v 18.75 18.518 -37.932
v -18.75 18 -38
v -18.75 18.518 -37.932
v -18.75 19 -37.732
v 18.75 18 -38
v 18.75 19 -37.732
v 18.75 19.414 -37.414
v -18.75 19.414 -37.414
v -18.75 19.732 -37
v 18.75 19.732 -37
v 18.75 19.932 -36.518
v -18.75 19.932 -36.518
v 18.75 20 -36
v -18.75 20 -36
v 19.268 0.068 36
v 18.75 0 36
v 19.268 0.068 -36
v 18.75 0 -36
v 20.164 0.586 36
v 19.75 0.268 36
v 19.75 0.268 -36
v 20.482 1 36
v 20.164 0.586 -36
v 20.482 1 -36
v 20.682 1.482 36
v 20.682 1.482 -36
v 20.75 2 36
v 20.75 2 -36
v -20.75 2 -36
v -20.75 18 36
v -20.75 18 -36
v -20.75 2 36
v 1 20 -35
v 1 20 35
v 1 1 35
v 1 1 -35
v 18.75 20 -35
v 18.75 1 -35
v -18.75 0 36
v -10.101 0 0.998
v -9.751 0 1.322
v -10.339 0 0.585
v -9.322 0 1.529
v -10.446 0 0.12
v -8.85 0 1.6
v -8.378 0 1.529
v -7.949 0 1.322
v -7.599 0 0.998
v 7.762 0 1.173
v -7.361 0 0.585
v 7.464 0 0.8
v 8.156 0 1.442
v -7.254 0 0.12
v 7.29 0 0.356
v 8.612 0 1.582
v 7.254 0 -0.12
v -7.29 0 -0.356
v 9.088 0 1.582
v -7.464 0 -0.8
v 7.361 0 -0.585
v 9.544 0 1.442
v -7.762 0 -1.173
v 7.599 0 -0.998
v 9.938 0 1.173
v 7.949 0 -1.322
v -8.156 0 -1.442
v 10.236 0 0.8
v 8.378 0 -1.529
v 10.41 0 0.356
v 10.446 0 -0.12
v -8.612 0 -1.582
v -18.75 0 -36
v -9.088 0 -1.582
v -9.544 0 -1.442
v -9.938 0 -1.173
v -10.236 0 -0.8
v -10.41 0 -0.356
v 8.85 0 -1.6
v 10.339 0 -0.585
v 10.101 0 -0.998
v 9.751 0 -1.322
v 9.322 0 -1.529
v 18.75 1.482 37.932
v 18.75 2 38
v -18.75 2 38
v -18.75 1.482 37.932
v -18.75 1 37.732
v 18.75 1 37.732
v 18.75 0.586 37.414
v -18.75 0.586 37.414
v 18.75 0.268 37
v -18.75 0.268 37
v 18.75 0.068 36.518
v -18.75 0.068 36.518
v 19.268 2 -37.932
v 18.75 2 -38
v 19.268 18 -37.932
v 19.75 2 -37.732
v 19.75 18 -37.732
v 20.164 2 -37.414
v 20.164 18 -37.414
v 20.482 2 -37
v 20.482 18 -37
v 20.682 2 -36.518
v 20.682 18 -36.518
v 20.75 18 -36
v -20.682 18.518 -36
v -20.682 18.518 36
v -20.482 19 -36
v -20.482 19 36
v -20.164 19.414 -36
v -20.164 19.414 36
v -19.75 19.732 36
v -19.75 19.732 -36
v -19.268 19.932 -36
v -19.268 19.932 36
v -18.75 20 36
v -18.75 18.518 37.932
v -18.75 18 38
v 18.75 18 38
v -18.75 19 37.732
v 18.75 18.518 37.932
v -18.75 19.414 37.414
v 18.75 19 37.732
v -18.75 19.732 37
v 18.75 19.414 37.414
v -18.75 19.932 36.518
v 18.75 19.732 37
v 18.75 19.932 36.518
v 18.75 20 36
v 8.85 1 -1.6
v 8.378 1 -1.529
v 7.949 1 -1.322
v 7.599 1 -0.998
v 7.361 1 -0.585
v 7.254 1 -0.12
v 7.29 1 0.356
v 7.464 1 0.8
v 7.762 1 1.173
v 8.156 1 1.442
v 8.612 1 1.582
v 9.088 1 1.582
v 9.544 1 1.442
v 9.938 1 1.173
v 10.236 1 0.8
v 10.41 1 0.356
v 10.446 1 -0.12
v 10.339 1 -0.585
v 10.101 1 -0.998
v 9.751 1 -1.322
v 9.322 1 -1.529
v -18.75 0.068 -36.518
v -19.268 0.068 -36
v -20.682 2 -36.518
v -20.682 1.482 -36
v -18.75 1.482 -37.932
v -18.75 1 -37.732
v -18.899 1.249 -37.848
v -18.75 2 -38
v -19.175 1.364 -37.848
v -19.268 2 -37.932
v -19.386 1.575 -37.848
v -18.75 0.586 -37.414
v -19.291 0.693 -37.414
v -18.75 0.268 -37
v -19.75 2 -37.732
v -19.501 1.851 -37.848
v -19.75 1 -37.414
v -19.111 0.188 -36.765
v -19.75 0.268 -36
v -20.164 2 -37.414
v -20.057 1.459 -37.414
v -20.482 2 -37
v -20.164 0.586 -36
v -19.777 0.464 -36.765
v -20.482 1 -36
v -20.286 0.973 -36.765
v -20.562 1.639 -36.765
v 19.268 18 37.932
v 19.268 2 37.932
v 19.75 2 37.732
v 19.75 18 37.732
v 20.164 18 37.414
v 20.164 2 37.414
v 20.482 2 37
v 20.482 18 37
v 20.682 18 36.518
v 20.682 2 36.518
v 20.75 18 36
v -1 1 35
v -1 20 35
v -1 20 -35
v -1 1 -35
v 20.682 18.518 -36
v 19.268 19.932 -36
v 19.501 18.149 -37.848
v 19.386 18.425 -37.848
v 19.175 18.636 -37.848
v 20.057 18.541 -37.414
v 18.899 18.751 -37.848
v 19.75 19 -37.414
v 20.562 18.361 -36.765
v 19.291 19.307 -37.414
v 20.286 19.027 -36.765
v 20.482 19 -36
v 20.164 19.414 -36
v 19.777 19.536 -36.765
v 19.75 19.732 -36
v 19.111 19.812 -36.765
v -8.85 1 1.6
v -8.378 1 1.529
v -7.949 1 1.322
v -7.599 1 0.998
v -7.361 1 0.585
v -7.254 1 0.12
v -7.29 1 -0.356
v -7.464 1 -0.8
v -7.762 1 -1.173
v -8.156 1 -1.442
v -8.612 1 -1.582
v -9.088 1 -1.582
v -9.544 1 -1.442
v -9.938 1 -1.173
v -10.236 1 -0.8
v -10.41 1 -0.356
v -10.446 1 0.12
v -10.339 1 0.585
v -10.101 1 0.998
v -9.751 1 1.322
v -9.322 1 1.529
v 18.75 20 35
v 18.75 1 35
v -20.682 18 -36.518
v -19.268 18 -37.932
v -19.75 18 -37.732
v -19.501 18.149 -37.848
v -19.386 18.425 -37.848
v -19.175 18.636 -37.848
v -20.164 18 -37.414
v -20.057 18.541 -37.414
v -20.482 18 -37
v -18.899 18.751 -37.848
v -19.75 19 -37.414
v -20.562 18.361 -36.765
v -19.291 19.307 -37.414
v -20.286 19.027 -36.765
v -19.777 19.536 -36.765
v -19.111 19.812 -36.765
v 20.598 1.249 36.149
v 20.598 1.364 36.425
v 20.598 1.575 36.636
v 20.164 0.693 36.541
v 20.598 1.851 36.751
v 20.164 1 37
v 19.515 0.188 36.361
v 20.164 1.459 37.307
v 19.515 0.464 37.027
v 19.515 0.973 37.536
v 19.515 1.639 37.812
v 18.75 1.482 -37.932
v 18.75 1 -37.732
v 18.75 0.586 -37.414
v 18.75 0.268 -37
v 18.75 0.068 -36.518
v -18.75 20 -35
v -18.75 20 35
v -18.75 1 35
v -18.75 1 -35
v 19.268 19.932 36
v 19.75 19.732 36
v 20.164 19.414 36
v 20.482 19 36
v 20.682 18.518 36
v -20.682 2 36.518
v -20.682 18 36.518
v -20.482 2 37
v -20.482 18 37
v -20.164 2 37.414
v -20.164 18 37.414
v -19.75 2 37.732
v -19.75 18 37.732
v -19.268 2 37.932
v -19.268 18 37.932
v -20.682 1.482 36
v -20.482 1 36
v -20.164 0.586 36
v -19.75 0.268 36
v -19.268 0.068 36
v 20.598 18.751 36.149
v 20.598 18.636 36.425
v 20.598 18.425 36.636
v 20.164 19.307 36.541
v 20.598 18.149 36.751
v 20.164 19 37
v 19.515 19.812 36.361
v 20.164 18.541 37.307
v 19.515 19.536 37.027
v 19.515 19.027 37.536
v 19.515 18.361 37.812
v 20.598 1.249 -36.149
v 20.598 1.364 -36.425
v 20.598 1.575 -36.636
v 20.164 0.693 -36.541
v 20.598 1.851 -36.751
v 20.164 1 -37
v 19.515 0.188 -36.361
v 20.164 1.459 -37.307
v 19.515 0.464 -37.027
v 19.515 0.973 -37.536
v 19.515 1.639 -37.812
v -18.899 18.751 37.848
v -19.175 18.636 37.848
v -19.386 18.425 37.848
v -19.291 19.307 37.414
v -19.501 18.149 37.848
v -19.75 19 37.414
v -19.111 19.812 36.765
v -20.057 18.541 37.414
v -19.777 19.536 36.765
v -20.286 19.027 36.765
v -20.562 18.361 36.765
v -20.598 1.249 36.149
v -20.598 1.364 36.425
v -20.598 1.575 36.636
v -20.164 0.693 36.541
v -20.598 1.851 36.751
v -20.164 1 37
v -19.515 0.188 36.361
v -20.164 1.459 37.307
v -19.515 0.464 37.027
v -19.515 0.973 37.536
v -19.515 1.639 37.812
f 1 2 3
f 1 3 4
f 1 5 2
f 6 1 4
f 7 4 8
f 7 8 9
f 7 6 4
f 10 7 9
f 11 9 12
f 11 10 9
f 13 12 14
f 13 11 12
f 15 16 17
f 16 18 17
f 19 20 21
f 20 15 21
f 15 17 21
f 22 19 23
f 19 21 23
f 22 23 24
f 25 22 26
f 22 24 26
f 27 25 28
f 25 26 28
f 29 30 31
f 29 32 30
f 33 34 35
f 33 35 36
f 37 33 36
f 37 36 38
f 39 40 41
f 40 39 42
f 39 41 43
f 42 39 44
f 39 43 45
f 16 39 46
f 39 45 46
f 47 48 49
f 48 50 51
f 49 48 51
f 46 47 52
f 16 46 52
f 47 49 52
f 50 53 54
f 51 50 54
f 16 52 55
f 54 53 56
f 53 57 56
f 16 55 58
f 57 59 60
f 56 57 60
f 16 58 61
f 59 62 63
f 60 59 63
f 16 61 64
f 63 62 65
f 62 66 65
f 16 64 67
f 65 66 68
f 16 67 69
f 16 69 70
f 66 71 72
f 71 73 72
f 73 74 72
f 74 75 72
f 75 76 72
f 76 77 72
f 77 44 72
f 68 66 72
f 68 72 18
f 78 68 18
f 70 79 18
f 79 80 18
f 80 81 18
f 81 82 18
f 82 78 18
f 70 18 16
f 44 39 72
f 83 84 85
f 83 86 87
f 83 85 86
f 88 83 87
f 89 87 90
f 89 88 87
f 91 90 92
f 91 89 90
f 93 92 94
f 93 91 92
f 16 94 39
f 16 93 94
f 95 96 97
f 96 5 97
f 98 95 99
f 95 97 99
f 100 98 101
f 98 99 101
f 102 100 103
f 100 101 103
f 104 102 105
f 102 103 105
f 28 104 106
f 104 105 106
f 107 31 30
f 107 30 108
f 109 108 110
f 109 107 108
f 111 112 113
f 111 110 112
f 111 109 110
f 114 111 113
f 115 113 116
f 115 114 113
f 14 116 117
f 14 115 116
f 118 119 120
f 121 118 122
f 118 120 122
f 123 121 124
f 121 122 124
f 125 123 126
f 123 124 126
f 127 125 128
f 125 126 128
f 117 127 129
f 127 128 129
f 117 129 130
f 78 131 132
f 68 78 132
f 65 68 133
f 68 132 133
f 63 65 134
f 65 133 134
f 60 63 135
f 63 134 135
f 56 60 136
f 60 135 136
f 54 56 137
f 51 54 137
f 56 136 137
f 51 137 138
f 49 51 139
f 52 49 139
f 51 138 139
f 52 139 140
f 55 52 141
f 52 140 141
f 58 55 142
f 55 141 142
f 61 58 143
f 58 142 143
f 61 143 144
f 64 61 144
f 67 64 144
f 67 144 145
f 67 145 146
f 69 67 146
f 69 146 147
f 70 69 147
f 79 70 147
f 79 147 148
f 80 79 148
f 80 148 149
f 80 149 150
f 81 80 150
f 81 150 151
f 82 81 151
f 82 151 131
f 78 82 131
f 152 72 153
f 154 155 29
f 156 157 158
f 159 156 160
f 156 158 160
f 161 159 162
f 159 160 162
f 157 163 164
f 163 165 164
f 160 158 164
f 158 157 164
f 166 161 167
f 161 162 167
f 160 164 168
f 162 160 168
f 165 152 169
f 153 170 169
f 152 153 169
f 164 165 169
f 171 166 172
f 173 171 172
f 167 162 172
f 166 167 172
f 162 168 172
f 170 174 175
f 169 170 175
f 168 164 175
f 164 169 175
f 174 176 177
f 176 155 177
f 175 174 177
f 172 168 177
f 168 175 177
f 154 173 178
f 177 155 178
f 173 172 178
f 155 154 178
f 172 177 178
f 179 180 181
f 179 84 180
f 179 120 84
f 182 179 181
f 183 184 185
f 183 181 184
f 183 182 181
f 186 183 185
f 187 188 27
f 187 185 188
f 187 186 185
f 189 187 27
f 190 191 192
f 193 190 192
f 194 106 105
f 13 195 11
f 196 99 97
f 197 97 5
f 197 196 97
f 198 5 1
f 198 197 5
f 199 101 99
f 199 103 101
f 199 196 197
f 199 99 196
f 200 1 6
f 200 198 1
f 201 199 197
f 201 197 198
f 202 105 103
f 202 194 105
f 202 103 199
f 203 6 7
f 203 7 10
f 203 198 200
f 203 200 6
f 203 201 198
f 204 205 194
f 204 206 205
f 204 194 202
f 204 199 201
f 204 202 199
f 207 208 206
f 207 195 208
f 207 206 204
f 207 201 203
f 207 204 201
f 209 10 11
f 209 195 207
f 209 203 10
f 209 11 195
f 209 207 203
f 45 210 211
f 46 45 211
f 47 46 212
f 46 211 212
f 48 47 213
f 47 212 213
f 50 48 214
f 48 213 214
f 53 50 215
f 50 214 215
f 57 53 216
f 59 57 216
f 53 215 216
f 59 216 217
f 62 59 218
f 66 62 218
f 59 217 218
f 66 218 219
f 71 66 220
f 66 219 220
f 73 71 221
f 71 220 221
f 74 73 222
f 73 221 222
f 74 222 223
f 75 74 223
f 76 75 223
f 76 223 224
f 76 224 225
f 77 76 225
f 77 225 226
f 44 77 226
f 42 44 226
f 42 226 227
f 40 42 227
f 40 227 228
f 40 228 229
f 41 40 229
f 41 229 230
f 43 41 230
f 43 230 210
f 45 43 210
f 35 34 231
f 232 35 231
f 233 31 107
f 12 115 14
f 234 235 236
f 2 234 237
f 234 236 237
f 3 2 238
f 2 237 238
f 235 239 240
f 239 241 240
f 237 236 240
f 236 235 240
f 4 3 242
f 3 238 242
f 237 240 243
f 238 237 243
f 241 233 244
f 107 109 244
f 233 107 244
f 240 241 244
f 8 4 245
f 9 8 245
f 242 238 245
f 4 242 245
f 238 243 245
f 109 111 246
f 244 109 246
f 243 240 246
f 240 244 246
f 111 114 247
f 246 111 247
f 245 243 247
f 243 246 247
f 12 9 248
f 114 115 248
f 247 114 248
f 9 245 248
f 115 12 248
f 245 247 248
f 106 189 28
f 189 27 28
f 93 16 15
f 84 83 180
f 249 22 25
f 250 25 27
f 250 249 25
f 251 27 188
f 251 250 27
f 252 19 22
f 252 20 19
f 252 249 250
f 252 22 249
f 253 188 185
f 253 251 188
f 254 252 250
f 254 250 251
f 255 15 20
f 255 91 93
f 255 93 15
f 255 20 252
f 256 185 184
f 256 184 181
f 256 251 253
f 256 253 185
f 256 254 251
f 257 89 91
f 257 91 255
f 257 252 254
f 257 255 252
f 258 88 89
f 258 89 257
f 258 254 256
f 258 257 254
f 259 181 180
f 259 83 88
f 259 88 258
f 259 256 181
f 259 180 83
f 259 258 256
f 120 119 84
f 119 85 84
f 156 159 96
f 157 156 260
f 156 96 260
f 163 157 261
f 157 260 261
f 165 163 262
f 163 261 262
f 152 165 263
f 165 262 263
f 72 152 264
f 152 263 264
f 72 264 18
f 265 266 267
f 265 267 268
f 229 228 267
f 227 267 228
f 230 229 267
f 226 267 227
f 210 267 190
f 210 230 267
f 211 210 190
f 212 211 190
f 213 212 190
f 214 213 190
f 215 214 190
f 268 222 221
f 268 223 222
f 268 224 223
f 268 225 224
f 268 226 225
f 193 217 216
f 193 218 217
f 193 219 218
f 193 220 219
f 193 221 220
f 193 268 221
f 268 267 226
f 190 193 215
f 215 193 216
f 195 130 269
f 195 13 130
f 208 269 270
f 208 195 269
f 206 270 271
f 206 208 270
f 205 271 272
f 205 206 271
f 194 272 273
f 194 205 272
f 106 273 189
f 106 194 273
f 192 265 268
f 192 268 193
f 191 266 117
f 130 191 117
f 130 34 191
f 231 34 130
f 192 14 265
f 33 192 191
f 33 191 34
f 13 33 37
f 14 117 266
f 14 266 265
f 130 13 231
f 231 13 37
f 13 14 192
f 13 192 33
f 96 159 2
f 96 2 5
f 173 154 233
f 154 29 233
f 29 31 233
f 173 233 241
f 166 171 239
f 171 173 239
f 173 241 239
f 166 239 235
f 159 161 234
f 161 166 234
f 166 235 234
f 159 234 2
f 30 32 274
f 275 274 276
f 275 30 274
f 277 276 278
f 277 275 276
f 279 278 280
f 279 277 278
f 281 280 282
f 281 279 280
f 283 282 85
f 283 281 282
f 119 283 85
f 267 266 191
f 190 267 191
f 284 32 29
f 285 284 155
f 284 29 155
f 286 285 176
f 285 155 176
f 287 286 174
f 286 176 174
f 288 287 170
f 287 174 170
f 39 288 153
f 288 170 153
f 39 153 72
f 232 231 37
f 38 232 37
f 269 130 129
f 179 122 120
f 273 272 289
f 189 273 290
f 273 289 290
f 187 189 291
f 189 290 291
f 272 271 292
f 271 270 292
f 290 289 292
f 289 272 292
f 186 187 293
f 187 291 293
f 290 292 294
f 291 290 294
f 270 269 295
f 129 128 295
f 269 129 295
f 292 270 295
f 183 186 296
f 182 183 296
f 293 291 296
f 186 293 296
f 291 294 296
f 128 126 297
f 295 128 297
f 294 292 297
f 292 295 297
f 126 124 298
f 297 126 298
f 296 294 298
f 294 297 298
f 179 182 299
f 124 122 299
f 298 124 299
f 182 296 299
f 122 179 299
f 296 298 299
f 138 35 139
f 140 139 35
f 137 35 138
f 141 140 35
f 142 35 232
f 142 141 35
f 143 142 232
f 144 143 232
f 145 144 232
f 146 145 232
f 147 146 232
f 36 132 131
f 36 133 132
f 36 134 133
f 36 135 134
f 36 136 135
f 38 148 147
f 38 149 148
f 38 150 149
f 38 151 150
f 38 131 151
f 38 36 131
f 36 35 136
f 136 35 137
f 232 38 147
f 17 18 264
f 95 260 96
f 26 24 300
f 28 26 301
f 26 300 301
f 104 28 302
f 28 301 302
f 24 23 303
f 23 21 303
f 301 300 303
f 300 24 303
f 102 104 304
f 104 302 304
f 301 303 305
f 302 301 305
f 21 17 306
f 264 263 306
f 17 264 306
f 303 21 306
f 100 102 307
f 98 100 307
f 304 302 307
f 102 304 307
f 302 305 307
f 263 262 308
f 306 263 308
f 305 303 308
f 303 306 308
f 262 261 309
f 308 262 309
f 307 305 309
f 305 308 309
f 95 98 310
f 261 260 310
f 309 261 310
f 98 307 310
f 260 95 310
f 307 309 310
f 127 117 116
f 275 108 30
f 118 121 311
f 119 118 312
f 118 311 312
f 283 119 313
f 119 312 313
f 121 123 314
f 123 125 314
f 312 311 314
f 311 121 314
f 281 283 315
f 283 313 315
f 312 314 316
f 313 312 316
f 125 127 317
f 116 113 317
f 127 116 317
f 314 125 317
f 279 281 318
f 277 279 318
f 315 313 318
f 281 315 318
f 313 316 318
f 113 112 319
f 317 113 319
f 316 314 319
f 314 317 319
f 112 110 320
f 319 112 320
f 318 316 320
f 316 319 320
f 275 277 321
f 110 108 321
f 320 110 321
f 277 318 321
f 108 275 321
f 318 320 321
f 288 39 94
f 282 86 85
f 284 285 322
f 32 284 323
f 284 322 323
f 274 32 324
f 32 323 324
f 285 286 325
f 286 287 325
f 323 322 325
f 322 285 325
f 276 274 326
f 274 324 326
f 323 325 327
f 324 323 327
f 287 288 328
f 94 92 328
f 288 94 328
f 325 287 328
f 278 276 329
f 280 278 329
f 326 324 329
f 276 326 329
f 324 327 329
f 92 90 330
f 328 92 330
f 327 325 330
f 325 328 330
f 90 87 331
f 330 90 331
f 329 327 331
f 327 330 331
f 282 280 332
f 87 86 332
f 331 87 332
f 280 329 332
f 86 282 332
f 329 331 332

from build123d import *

# Parameters (mm, degrees)
SKETCH_1_W          = 41.5
SKETCH_1_H          = 76
EXTRUDE_1_DEPTH     = 20
SKETCH_2_W          = 17.75
SKETCH_2_H          = 70
CUT_EXTRUDE_1_DEPTH = 19
SKETCH_3_R          = 1.6
CUT_EXTRUDE_2_DEPTH = 19
FILLET_1_R          = 2


with BuildPart() as part:
    # 草图1 → 凸台-拉伸1 (new body)
    with BuildSketch(Plane(origin=(0, 0, 0), x_dir=(1, 0, 0), z_dir=(0, 1, 0))):
        Rectangle(SKETCH_1_W, SKETCH_1_H)
    extrude(amount=EXTRUDE_1_DEPTH)

    # 草图2 → 切除-拉伸1 (cut)
    with BuildSketch(Plane(origin=(0, 20, 0), x_dir=(1, 0, 0), z_dir=(0, 1, 0))):
        with Locations((-9.875, 0)):
            Rectangle(SKETCH_2_W, SKETCH_2_H)
        with Locations((9.875, 0)):
            Rectangle(SKETCH_2_W, SKETCH_2_H)
    extrude(amount=-CUT_EXTRUDE_1_DEPTH, mode=Mode.SUBTRACT)

    # 草图3 → 切除-拉伸2 (cut)
    with BuildSketch(Plane(origin=(0, 1, 0), x_dir=(1, 0, 0), z_dir=(0, 1, 0))):
        with Locations(Location((-8.85, 0, 0), (0, 0, 270))):
            Circle(SKETCH_3_R)
        with Locations(Location((8.85, 0, 0), (0, 0, 90))):
            Circle(SKETCH_3_R)
    extrude(amount=-CUT_EXTRUDE_2_DEPTH, mode=Mode.SUBTRACT)

    # 圆角1
    fillet_1_edges = [part.edges().sort_by_distance(p)[0] for p in [
        (-20.75, 20, 0),
        (0, 20, 38),
        (20.75, 20, 0),
        (0, 0, 38),
        (-20.75, 0, 0),
        (0, 0, -38),
        (20.75, 0, 0),
        (20.75, 10, 38),
        (-20.75, 10, 38),
        (-20.75, 10, -38),
        (20.75, 10, -38),
        (0, 20, -38),
    ]]
    fillet(fillet_1_edges, radius=FILLET_1_R - 0.0001)  # a hair under: the kernel refuses the full size


solid = part.part
